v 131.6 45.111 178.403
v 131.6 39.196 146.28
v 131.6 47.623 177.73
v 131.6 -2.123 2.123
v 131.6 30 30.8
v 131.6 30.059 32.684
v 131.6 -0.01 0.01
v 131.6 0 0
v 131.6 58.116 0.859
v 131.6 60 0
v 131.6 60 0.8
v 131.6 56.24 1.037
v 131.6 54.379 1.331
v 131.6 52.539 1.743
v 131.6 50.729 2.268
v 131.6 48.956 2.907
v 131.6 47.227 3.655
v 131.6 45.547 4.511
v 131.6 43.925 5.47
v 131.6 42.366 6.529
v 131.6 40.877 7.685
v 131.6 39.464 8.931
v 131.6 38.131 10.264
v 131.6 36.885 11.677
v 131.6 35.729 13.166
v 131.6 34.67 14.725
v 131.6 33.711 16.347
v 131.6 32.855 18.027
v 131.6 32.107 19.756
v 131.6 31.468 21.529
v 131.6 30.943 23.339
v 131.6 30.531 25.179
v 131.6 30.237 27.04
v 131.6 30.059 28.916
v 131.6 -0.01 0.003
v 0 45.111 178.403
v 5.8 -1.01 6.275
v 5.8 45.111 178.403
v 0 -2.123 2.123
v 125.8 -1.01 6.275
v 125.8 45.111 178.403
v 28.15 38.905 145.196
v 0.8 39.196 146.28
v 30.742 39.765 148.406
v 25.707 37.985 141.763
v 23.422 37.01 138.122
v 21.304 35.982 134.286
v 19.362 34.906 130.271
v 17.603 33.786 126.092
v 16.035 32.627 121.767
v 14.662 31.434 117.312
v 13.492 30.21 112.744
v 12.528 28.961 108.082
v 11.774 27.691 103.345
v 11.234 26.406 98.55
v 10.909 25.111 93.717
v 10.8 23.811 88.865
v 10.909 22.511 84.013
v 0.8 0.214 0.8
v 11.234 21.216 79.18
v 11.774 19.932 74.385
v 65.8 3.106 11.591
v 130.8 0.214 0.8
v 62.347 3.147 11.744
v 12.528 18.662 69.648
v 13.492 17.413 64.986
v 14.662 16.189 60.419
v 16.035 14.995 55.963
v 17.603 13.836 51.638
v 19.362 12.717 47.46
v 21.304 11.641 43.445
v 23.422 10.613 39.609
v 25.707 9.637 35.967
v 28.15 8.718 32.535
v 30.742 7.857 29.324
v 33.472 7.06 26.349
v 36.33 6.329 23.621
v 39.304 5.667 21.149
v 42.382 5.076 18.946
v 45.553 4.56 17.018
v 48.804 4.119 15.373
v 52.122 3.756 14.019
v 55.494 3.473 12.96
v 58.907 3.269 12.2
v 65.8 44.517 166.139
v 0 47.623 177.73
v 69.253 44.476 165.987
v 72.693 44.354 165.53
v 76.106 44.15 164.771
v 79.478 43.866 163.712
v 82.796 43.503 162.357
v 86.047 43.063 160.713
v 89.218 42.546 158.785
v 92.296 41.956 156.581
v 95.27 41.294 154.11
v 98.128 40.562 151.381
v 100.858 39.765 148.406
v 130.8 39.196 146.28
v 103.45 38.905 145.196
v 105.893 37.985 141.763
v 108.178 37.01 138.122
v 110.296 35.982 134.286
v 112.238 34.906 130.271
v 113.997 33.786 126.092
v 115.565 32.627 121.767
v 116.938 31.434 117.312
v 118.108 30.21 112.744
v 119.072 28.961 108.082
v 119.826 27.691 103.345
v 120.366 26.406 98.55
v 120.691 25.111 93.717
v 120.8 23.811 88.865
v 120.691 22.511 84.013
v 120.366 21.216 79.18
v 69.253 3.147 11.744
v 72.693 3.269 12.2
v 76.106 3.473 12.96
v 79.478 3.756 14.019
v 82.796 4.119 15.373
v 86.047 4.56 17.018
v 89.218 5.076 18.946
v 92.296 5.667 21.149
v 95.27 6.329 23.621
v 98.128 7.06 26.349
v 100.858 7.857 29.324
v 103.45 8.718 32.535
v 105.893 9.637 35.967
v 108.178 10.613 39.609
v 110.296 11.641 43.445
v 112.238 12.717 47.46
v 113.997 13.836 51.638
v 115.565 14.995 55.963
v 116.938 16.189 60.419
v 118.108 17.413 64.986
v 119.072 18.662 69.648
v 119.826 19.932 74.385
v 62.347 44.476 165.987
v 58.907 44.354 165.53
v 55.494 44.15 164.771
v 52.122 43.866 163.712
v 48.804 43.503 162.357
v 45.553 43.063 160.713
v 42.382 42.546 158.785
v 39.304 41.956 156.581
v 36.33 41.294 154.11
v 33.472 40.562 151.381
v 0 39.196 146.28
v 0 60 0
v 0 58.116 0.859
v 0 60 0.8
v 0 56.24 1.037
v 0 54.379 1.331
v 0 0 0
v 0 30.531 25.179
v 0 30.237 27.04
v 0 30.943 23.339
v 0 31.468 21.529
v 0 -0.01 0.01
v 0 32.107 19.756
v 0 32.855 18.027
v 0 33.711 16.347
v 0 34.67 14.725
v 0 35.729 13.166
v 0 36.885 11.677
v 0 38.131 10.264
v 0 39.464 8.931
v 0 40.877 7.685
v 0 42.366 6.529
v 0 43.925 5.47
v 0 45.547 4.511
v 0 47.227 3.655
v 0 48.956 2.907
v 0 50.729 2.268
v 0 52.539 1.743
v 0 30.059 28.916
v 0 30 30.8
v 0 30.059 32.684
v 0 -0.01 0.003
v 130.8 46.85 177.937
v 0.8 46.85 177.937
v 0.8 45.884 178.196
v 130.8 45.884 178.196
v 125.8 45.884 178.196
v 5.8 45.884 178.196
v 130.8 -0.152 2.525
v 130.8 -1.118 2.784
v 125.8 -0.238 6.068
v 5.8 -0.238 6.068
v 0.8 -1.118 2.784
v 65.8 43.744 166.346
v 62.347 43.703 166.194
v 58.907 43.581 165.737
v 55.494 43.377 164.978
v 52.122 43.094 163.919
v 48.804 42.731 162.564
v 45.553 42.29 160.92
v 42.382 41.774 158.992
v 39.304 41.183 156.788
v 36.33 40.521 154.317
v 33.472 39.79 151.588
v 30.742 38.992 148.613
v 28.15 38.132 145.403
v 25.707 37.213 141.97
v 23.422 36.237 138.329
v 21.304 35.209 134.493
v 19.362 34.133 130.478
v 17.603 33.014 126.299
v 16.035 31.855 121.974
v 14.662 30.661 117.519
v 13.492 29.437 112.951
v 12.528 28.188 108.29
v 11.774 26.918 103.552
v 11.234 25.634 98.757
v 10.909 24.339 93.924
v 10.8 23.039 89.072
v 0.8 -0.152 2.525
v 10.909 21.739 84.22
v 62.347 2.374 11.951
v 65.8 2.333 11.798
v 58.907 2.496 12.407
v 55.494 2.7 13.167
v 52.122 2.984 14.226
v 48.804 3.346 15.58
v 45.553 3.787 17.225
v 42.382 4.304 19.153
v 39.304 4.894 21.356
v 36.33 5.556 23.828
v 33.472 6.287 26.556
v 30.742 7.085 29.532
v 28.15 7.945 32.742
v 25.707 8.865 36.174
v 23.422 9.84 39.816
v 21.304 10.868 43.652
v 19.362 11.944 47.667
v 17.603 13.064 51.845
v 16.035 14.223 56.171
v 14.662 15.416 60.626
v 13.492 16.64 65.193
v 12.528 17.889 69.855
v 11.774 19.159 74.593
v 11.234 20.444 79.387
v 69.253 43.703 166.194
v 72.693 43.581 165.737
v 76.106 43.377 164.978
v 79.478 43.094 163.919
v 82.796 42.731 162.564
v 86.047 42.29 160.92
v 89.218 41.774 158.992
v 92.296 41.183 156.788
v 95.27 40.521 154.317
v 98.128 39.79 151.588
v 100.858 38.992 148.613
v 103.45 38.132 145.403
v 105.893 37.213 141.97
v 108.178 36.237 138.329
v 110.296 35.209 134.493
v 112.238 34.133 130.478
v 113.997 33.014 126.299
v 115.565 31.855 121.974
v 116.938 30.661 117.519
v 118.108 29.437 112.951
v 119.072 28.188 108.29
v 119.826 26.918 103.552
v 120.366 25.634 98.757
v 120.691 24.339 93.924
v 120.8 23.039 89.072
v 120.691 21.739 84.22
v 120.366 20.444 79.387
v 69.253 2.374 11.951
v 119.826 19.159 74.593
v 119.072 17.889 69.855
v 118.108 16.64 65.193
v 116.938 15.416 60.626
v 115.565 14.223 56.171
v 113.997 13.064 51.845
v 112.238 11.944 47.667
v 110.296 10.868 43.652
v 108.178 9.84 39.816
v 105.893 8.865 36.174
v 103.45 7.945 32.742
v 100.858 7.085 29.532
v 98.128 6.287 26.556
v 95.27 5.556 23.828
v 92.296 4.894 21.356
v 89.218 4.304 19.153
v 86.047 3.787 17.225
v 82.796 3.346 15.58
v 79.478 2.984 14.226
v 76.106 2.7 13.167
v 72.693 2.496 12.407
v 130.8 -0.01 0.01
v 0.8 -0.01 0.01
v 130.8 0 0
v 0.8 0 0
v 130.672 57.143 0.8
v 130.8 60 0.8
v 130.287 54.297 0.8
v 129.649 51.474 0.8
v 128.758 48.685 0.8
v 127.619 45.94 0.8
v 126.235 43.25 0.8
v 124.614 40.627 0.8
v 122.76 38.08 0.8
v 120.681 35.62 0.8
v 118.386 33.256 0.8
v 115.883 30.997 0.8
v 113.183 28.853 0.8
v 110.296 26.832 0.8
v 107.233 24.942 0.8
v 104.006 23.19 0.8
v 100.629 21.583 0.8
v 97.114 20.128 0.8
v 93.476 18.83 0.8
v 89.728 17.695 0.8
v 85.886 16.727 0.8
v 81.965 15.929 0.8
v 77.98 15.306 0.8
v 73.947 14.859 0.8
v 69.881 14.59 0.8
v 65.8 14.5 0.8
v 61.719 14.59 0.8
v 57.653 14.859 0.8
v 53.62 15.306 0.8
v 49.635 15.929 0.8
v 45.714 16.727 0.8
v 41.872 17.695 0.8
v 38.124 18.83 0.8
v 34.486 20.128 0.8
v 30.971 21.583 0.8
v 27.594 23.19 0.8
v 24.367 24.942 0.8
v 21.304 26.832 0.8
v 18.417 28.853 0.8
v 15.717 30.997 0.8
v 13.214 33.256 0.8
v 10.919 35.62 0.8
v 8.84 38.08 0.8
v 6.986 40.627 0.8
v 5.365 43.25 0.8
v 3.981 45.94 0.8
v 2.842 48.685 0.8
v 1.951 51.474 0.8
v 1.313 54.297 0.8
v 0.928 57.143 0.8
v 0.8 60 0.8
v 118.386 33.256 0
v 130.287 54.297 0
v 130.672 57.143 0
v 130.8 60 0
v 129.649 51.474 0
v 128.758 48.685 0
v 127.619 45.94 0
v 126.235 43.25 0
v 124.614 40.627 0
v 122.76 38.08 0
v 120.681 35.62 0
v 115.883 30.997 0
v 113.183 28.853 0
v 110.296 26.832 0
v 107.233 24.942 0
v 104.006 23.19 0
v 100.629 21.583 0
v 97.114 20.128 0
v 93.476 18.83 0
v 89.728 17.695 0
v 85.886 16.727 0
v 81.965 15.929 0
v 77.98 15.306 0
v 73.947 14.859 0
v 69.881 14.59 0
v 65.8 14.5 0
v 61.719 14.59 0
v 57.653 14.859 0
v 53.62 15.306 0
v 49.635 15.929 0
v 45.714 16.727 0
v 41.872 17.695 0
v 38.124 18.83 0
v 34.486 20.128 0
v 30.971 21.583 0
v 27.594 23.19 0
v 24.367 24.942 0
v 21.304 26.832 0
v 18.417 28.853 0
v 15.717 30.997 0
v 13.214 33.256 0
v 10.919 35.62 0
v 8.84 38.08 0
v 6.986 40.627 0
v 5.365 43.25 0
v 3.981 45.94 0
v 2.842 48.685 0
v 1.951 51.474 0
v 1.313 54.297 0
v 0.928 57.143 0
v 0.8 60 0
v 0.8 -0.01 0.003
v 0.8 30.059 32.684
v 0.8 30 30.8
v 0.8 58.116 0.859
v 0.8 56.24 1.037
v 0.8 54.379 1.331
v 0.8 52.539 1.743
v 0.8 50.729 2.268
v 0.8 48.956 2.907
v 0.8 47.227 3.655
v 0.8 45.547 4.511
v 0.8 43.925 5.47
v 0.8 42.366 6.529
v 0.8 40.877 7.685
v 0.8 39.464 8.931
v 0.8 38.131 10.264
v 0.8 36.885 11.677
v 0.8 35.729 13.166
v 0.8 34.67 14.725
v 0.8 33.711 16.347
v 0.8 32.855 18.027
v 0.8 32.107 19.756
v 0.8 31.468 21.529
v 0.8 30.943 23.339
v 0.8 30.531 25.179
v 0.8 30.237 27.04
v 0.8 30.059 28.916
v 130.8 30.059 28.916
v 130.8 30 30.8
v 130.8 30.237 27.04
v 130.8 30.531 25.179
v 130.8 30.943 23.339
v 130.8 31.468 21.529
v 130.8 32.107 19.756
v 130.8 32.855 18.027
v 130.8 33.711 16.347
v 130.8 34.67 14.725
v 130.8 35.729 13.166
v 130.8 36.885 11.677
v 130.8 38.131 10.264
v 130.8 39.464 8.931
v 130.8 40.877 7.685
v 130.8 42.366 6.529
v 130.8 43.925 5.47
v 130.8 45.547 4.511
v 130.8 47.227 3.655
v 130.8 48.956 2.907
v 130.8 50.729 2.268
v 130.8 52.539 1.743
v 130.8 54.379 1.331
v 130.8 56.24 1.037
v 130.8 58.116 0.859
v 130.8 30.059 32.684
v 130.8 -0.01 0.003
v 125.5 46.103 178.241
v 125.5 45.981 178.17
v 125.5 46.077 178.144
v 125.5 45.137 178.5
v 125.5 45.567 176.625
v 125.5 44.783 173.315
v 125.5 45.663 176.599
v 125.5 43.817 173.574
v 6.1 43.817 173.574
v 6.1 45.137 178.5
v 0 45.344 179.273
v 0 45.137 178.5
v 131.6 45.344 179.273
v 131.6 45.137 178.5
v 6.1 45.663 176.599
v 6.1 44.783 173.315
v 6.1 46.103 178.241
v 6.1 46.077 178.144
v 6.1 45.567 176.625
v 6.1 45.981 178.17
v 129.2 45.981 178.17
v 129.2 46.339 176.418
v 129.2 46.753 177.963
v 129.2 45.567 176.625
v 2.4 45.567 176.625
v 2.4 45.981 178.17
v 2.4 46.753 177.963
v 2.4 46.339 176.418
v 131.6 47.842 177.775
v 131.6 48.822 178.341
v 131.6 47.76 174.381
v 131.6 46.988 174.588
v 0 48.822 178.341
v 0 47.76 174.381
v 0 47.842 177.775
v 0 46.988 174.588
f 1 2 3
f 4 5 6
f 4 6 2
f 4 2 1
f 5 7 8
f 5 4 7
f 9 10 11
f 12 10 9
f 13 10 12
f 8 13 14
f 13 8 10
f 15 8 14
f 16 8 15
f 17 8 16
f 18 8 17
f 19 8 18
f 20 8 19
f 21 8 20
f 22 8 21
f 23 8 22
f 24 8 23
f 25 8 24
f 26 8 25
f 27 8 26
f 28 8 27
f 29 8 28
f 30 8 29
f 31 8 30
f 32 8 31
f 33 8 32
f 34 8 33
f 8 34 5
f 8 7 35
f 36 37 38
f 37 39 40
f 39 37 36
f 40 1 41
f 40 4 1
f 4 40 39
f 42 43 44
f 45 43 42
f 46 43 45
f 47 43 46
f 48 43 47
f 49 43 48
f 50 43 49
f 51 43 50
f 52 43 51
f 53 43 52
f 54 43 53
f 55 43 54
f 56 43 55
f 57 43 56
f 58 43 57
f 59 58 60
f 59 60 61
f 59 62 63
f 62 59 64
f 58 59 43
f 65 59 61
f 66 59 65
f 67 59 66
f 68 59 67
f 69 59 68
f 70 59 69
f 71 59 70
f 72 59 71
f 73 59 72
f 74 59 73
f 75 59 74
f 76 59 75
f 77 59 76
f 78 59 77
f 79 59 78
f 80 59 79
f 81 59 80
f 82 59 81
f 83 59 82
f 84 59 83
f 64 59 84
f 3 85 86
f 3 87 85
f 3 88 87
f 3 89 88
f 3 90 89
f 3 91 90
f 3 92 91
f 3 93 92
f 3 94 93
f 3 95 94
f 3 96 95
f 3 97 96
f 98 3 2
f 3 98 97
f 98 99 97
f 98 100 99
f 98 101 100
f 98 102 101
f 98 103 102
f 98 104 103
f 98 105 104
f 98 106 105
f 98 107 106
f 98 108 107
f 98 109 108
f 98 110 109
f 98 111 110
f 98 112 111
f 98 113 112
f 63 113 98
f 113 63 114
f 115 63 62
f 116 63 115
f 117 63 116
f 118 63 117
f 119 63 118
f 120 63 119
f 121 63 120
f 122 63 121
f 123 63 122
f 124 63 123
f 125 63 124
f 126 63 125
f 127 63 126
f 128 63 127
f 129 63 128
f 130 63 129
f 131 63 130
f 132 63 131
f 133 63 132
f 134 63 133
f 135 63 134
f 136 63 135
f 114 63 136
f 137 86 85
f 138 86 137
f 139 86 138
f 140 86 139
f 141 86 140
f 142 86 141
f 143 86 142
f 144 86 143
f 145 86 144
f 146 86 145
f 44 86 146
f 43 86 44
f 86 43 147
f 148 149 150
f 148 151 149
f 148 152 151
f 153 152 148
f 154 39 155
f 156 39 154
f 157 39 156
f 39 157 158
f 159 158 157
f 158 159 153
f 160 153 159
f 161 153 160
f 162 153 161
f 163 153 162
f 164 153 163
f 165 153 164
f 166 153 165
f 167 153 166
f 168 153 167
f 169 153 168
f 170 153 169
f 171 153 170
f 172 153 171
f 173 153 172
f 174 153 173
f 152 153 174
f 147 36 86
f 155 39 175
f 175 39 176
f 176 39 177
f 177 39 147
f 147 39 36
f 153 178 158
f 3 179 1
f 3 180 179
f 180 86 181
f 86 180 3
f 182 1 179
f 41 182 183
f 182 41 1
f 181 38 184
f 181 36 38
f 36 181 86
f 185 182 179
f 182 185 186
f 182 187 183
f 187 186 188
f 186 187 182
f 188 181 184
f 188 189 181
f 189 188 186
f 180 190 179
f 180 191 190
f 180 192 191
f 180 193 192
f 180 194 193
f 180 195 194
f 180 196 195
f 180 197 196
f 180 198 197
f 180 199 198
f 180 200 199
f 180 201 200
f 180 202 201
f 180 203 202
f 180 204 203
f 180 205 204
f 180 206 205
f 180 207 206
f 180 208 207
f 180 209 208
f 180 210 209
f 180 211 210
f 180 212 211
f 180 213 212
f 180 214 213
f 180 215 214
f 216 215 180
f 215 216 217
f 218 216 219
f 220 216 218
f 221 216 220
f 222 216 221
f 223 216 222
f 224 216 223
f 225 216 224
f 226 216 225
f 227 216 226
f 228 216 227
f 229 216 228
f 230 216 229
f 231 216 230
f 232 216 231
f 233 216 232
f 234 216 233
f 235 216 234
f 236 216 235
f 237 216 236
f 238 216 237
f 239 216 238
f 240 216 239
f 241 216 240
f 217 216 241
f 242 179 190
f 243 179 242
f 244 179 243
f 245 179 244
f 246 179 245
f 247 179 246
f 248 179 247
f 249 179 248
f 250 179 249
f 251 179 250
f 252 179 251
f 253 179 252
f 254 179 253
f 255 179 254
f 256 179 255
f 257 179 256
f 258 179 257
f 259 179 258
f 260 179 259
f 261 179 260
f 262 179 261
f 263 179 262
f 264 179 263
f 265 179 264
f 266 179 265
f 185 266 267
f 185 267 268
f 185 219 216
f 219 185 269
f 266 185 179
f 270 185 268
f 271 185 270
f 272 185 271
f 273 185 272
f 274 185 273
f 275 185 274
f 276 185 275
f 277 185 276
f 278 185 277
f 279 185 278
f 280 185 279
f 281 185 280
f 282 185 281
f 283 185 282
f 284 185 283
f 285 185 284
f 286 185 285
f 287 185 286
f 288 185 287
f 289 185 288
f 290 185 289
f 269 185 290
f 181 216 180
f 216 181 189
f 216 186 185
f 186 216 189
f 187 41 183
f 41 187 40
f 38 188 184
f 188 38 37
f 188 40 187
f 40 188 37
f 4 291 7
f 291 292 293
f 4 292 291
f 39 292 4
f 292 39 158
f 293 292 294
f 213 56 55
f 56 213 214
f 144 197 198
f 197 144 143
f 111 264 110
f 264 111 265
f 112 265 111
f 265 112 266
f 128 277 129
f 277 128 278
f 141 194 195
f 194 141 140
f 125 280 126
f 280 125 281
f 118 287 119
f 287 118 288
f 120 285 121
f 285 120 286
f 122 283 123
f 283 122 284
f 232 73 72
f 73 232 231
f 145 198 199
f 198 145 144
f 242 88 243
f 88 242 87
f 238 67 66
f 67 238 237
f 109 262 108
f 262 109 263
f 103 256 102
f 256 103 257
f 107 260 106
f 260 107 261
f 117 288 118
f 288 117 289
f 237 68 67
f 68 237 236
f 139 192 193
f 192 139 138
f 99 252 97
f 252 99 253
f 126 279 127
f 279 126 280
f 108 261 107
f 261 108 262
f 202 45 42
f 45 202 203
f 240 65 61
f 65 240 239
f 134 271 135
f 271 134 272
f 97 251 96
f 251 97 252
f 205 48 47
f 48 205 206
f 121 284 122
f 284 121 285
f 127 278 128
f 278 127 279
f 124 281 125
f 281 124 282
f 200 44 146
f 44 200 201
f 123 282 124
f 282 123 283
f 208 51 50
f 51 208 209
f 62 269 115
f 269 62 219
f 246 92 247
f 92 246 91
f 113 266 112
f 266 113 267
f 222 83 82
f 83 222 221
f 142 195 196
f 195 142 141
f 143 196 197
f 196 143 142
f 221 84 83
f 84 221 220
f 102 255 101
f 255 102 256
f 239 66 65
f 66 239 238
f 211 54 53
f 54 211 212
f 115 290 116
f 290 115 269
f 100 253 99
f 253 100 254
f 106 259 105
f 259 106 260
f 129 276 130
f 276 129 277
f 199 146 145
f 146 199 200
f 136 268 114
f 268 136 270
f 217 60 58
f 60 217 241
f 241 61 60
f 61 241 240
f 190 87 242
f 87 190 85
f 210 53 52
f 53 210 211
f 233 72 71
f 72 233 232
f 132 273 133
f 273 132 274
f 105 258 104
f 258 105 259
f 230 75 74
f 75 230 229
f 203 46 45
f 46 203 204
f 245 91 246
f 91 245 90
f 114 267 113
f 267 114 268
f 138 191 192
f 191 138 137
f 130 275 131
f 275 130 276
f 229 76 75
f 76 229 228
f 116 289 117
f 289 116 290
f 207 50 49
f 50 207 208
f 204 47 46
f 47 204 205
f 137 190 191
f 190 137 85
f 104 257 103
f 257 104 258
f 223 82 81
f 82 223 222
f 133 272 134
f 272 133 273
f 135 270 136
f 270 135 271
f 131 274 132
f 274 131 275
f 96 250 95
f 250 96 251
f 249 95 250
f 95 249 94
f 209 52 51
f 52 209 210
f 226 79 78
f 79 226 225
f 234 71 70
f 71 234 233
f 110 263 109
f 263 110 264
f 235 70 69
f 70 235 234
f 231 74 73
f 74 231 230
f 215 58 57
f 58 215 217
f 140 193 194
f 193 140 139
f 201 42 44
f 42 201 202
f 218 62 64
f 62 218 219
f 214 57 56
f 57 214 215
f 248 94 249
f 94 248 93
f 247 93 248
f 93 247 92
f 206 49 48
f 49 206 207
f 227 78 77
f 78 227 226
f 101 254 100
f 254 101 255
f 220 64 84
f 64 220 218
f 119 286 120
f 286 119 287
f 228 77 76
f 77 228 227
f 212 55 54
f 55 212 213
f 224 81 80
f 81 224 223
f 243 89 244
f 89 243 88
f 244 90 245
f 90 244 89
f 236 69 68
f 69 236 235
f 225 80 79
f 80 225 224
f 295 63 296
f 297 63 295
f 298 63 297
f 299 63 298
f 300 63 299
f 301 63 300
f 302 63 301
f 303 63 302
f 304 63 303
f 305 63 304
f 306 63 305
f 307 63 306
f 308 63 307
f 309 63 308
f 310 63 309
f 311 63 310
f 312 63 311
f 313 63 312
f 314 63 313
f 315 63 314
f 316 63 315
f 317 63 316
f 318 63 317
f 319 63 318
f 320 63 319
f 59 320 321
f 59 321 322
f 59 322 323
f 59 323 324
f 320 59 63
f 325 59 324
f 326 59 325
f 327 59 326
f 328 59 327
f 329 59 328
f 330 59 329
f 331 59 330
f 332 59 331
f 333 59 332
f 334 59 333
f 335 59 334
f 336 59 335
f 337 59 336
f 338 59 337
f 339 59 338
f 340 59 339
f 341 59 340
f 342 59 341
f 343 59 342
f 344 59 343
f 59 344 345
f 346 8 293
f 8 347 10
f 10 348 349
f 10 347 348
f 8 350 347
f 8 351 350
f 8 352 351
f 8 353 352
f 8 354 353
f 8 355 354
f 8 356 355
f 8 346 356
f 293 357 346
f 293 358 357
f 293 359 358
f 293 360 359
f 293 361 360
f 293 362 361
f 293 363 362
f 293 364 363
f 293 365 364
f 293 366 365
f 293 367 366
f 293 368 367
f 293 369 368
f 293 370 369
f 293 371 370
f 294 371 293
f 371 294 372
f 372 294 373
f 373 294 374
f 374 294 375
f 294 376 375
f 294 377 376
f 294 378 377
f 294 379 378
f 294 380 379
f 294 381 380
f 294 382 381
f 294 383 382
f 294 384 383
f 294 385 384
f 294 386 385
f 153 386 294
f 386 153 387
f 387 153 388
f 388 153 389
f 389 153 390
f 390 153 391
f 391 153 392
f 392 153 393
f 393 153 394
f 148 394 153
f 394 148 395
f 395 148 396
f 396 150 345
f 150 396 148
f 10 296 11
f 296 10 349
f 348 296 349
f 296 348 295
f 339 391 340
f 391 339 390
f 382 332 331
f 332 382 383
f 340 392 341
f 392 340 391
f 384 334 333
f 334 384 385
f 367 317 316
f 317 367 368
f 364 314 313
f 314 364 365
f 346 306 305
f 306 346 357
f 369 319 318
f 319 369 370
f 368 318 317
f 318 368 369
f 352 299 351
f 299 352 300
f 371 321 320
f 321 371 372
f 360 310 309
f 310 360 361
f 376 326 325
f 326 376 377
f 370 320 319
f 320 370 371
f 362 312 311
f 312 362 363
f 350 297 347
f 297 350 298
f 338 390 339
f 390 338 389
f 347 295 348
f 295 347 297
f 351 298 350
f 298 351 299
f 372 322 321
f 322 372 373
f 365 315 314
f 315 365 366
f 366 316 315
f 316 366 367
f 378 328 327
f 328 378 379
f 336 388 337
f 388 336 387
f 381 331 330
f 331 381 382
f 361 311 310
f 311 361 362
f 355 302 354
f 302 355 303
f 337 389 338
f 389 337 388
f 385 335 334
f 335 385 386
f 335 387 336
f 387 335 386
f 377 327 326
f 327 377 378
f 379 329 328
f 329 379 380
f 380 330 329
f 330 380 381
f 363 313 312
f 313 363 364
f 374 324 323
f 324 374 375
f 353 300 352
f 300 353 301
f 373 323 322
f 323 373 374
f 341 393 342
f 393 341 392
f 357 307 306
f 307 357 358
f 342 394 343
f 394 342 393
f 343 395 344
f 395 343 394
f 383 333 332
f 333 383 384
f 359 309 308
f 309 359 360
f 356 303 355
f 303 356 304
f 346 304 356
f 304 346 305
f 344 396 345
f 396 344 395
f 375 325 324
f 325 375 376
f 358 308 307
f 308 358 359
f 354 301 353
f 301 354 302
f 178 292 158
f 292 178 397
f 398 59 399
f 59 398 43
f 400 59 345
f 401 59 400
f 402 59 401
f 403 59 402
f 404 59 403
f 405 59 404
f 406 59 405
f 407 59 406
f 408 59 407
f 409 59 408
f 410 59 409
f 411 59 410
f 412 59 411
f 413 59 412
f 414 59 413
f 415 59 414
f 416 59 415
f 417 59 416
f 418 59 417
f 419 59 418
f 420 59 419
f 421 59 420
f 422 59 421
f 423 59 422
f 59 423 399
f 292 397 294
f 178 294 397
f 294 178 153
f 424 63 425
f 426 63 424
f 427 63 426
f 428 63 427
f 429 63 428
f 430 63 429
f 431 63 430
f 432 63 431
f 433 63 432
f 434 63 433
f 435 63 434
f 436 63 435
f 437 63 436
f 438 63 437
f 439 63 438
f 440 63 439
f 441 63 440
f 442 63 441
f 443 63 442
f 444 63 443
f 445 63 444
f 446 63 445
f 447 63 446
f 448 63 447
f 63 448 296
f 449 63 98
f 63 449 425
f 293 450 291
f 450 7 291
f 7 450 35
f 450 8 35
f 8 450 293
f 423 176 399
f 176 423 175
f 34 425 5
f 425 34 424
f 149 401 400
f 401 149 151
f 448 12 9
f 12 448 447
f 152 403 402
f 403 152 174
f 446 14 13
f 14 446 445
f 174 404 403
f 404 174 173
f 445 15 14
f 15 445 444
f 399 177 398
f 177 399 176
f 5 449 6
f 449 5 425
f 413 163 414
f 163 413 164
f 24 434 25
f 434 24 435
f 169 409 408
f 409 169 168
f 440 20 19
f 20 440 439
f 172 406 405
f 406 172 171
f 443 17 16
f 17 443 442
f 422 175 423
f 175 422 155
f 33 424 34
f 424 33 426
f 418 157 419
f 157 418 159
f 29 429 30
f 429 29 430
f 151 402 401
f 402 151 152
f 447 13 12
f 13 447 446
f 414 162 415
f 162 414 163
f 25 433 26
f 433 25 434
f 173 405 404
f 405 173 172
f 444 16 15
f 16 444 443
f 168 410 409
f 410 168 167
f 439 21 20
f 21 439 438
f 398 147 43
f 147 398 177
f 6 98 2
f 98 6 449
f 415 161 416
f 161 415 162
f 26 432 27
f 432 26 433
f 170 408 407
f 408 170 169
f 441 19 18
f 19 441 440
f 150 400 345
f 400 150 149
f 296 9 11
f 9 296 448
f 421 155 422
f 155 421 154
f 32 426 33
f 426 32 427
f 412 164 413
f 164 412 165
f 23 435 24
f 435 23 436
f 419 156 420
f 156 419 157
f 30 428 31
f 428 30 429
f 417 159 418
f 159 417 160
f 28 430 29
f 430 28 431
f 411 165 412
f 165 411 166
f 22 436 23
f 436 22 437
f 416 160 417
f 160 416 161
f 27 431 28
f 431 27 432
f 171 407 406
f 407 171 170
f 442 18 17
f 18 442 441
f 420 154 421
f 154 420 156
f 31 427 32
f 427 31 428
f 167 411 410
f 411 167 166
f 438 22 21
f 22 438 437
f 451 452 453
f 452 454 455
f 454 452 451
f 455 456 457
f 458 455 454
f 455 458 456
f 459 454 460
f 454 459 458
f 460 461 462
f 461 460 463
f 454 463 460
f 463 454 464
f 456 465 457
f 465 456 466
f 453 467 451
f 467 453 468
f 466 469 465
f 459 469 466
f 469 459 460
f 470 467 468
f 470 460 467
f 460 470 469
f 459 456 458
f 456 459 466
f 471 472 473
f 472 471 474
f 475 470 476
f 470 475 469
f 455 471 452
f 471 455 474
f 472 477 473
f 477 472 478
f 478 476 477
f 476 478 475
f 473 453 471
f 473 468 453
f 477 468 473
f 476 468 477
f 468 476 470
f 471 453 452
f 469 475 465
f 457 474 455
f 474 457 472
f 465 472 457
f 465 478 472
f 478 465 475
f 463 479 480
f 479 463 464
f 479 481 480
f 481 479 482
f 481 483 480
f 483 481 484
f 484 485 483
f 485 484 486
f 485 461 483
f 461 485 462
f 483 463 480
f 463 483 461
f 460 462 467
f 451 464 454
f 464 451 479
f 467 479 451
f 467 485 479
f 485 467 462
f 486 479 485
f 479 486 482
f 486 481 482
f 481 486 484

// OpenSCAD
// -----------------------------------------------------
// Bilderrahmen V2
//
//  Detlev Ahlgrimm, 11.2018
// -----------------------------------------------------

// what to render
part=0;   // [0:assembled, 1:print, 2:frame only, 3:top edge only]

// width of photo
wp=130;   // [70:250]

// height of photo
hp=180;   // [70:250]

// thickness of photo
tp=1;     // [0.5:0.1:3]

// wall thickness
wt=0.8;   // [0.5:0.05:3]

// border thickness
bt=5;     // [1:0.1:10]

// support for opening
iso=0;    // [0:no support, 1:support]

// radius for support
sr=18;    // [10:0.5:30]

// shift for support
ss=0;     // [0:50]


/* [Hidden] */
$fn=100;
inner=[wp, hp, tp];

// -----------------------------------------------------
//    v : Abmessungs-Vektor
//    r : Radius der Aussparungen
//    w : Wandstaerke zwischen den Aussparungen
//    i : invertieren (true:Sechseck-Umrandungen, false:Sechsecke)
//    a : anschraegen 45 Grad (bei true)
// -----------------------------------------------------
module HexPatternV2(v, r=10, w=1, i=true, a=false) {
  dx=r*1.5;
  dy=r*0.866025;      // 0.866025=sqrt(3)/2
  sy=(i) ? -0.1 : 0;
  az=(i) ? 0.2 : 0;
  r1=(a) ? r-w/2-(v.z+0.2) : r-w/2;

  intersection() {
    difference() {
      if(i) cube(v);
      for(yi=[0:1:v.y/dy+1]) {
        for(xi=[0:1:v.x/(2*dx)+1]) {
          if((yi%2)==1) {
            translate([xi*2*dx+dx, yi*dy, sy]) cylinder(r1=r1, r2=r-w/2, h=v.z+az, $fn=6);
          } else {
            translate([xi*2*dx, yi*dy, sy]) cylinder(r1=r1, r2=r-w/2, h=v.z+az, $fn=6);
          }
        }
      }
    }
    if(!i) cube(v);
  }
}

// -----------------------------------------------------
//
// -----------------------------------------------------
module Frame() {
  rotate([75, 0, 0]) 
  difference() {
    cube([inner.x+2*wt, inner.y+5*wt, inner.z+2*wt]);
    translate([wt, 3*wt, wt]) cube([inner.x, inner.y+3*wt, inner.z]);
    translate([wt+bt, wt+bt, wt+inner.z-0.01]) cube([inner.x-2*bt, inner.y+3*wt, 2*wt]);
    rotate([-75-45, 0, 0]) translate([-0.1, -2*(wt+inner.z), -(wt+inner.z)]) cube([inner.x+2*wt+0.2, 2*(wt+inner.z), wt+inner.z]);
    translate([(inner.x+2*wt)/2, (inner.y+5*wt)/2, -0.1]) scale([(inner.x-20)/2, (inner.y-20)/2, 1]) cylinder(r=1, h=wt+0.2);
  }

  difference() {
    cube([inner.x+2*wt, inner.y/3, wt]);
    translate([(inner.x+2*wt)/2, inner.y/3, -0.1]) scale([1, 0.7, 1]) cylinder(d=inner.x, h=wt+0.2);
  }
  if(iso==1) {
    rotate([75, 0, 0]) intersection() {
      translate([-ss, inner.y+5*wt, 0]) rotate([0, 0, -90]) HexPatternV2([inner.y+5*wt, (inner.x+2*wt)+50, wt-0.01], sr, 4);
      cube([inner.x+2*wt, inner.y+5*wt, inner.z+2*wt]);
    }
  }
  cube([inner.x+2*wt, 1, wt]);

  difference() {
    for(x=[0, inner.x+wt])
      translate([x, 0, 0]) hull() {
        cube([wt, inner.y/3, wt]);
        rotate([75, 0, 0]) cube([wt, inner.y, 0.01]);
      }
    hull() {
      translate([-0.1, inner.y/3, inner.y/6+wt]) rotate([0, 90, 0]) cylinder(r=inner.y/6, h=inner.x+4*wt+0.2);
      translate([-0.1, inner.y/3+inner.y/15, inner.y]) rotate([0, 90, 0]) cylinder(r=inner.y/6, h=inner.x+4*wt+0.2);
    }
  }
}

// -----------------------------------------------------
//
// -----------------------------------------------------
module TopEdge() {
  translate([wt+bt+0.3, 5*wt+inner.y-bt, wt+inner.z-0.2]) cube([inner.x-2*bt-0.6, bt+wt, wt+0.2]);
  translate([3*wt, 3*wt+inner.y, wt+0.1]) cube([inner.x-4*wt, 2*wt, inner.z-0.2]);
  translate([0, inner.y+5*wt+0.1, -wt-0.2]) cube([inner.x+2*wt, wt, inner.z+3*wt+0.2]);
  translate([0, inner.y+wt, -wt-0.2]) cube([inner.x+2*wt, 4*wt+0.2, wt]);
}

if(part==0) {
  Frame();
  rotate([75, 0, 0]) TopEdge();
} else if(part==1) {
  Frame();
  translate([0, -10*wt, 0]) rotate([-90, 0, 0]) translate([0, -(6*wt+inner.y+0.1), wt+0.2]) TopEdge();
} else if(part==2) {
  Frame();
} else if(part==3) {
  translate([0, -10*wt, 0]) rotate([-90, 0, 0]) translate([0, -(5*wt+inner.y+0.1), wt+0.2]) TopEdge();
}
